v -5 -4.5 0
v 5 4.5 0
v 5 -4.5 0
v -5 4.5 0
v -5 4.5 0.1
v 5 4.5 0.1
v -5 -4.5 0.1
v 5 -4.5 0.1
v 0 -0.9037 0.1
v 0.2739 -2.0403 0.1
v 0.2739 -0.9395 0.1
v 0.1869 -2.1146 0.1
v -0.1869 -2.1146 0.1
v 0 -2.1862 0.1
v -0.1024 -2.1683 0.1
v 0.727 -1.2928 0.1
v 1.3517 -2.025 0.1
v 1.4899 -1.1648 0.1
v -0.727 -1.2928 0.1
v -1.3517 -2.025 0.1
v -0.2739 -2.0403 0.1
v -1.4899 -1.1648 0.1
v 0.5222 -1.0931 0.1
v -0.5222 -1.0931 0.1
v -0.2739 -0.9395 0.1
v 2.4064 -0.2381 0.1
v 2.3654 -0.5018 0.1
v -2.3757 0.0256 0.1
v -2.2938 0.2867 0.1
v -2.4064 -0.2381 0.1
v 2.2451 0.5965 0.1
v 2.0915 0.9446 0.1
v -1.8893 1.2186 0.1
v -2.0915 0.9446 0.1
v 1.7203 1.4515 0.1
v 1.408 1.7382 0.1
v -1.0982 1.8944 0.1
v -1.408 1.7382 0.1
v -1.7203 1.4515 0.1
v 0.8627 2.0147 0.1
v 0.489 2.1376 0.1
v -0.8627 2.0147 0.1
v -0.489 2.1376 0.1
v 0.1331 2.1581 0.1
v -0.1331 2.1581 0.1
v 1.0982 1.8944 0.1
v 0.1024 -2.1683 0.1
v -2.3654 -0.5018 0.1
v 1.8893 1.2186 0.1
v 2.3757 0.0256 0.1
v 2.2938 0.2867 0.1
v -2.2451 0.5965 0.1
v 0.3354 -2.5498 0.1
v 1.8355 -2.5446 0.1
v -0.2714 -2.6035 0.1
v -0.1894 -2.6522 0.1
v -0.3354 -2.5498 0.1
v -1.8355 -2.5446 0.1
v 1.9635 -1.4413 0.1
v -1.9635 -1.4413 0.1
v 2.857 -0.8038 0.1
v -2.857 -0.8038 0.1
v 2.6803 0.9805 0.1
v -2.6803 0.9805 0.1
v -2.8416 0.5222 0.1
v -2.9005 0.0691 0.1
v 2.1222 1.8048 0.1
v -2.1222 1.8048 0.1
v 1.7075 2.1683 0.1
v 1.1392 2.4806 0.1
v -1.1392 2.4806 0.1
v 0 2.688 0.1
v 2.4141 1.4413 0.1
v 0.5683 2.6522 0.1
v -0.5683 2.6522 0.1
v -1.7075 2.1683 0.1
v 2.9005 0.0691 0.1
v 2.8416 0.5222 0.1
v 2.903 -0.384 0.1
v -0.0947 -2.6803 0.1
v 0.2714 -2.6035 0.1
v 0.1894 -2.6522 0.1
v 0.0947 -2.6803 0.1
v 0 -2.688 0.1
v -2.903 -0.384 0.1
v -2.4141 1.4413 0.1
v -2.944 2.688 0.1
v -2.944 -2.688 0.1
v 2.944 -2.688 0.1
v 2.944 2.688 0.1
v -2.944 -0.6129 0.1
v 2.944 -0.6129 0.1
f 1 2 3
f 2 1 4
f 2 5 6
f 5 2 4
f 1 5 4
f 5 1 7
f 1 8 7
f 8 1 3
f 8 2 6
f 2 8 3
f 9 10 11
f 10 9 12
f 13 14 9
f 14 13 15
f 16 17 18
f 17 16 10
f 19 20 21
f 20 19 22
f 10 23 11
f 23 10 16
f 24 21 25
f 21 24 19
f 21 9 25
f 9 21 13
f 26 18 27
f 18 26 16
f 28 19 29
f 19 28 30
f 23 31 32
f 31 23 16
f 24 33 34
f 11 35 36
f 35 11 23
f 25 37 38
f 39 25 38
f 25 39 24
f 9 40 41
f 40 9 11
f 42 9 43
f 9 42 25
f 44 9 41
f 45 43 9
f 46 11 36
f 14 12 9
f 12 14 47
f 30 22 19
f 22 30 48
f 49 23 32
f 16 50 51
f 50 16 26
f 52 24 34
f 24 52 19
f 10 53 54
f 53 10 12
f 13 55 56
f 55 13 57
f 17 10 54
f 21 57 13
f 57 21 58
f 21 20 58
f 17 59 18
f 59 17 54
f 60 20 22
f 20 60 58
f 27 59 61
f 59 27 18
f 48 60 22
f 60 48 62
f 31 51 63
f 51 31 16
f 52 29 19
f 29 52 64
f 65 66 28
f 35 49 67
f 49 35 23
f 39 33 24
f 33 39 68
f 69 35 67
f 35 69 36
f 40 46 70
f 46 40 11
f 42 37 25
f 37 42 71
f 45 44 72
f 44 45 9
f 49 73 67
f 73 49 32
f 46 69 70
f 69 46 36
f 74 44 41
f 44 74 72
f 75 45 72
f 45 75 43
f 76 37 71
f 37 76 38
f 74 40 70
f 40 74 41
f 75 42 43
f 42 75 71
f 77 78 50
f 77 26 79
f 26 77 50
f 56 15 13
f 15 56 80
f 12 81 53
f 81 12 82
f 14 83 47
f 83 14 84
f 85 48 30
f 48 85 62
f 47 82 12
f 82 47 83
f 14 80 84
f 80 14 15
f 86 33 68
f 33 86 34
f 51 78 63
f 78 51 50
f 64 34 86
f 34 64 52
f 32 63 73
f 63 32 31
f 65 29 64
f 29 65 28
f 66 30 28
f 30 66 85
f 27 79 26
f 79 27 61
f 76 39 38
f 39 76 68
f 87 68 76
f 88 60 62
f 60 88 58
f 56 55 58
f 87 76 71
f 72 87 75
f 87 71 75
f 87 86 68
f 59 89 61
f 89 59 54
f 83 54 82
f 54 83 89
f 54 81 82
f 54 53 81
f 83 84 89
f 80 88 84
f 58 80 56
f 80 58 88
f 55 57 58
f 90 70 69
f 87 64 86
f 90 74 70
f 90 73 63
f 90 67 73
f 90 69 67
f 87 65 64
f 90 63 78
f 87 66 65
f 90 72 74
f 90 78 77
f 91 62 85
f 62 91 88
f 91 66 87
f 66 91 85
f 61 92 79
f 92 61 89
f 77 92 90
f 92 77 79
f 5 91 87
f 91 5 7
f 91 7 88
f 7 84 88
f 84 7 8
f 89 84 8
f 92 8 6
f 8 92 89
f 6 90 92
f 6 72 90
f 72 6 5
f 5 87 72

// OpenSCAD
// file: ../p/4-4edge.scad
use <../lib.scad>
$fa=1; $fs=0.2;
function ldraw_lib__4_4edge(realsolid=false) = [
// 0 Circle 1.0
// 0 Name: 4-4edge.dat
// 0 Author: James Jessiman
// 0 !LDRAW_ORG Primitive UPDATE 2017-01
// 0 !LICENSE Licensed under CC BY 2.0 and CC BY 4.0 : see CAreadme.txt
// 
// 0 BFC CERTIFY CCW
  [0,"BFC","CERTIFY"],
  [0,"BFC","CCW"],
// 
// 0 !HISTORY 1998-12-15 [PTadmin] Official Update 1998-10
// 0 !HISTORY 2005-12-28 [PTadmin] Official Update 2005-01
// 0 !HISTORY 2007-06-24 [PTadmin] Header formatted for Contributor Agreement
// 0 !HISTORY 2008-07-01 [PTadmin] Official Update 2008-01
// 0 !HISTORY 2017-01-15 [Steffen] BFCed
// 0 !HISTORY 2017-12-30 [PTadmin] Official Update 2017-01
// 
// 
// 2 24 1 0 0 0.9239 0 0.3827
  [2,24,1,0,0,0.9239,0,0.3827],
// 2 24 0.9239 0 0.3827 0.7071 0 0.7071
  [2,24,0.9239,0,0.3827,0.7071,0,0.7071],
// 2 24 0.7071 0 0.7071 0.3827 0 0.9239
  [2,24,0.7071,0,0.7071,0.3827,0,0.9239],
// 2 24 0.3827 0 0.9239 0 0 1
  [2,24,0.3827,0,0.9239,0,0,1],
// 2 24 0 0 1 -0.3827 0 0.9239
  [2,24,0,0,1,-0.3827,0,0.9239],
// 2 24 -0.3827 0 0.9239 -0.7071 0 0.7071
  [2,24,-0.3827,0,0.9239,-0.7071,0,0.7071],
// 2 24 -0.7071 0 0.7071 -0.9239 0 0.3827
  [2,24,-0.7071,0,0.7071,-0.9239,0,0.3827],
// 2 24 -0.9239 0 0.3827 -1 0 -0
  [2,24,-0.9239,0,0.3827,-1,0,-0],
// 2 24 -1 0 -0 -0.9239 0 -0.3827
  [2,24,-1,0,-0,-0.9239,0,-0.3827],
// 2 24 -0.9239 0 -0.3827 -0.7071 0 -0.7071
  [2,24,-0.9239,0,-0.3827,-0.7071,0,-0.7071],
// 2 24 -0.7071 0 -0.7071 -0.3827 0 -0.9239
  [2,24,-0.7071,0,-0.7071,-0.3827,0,-0.9239],
// 2 24 -0.3827 0 -0.9239 0 0 -1
  [2,24,-0.3827,0,-0.9239,0,0,-1],
// 2 24 0 0 -1 0.3827 0 -0.9239
  [2,24,0,0,-1,0.3827,0,-0.9239],
// 2 24 0.3827 0 -0.9239 0.7071 0 -0.7071
  [2,24,0.3827,0,-0.9239,0.7071,0,-0.7071],
// 2 24 0.7071 0 -0.7071 0.9239 0 -0.3827
  [2,24,0.7071,0,-0.7071,0.9239,0,-0.3827],
// 2 24 0.9239 0 -0.3827 1 0 0
  [2,24,0.9239,0,-0.3827,1,0,0],
];
module ldraw_lib__4_4edge(step=0, col=false, unit=2/5, alt=false, line=0.2, solid=!$preview)
    makepoly(ldraw_lib__4_4edge(solid), step=step, col=col, unit=unit, alt=alt, line=line, solid=solid);
ldraw_lib__4_4edge(line=0.2);
// file: ../p/4-4disc.scad
use <../lib.scad>
$fa=1; $fs=0.2;
function ldraw_lib__4_4disc(realsolid=false) = [
// 0 Disc 1.0
// 0 Name: 4-4disc.dat
// 0 Author: James Jessiman
// 0 !LDRAW_ORG Primitive UPDATE 2002-02
// 0 !LICENSE Licensed under CC BY 2.0 and CC BY 4.0 : see CAreadme.txt
// 
// 0 BFC CERTIFY CCW
  [0,"BFC","CERTIFY"],
  [0,"BFC","CCW"],
// 
// 0 !HISTORY 1998-12-15 [PTadmin] Official Update 1998-10
// 0 !HISTORY 2002-03-23 [sbliss] Added BFC statement
// 0 !HISTORY 2002-04-25 [PTadmin] Official Update 2002-02
// 0 !HISTORY 2007-06-24 [PTadmin] Header formatted for Contributor Agreement
// 0 !HISTORY 2008-07-01 [PTadmin] Official Update 2008-01
// 
// 
// 3 16 0 0 0 1 0 0 0.9239 0 0.3827
  [3,16,0,0,0,1,0,0,0.9239,0,0.3827],
// 3 16 0 0 0 0.9239 0 0.3827 0.7071 0 0.7071
  [3,16,0,0,0,0.9239,0,0.3827,0.7071,0,0.7071],
// 3 16 0 0 0 0.7071 0 0.7071 0.3827 0 0.9239
  [3,16,0,0,0,0.7071,0,0.7071,0.3827,0,0.9239],
// 3 16 0 0 0 0.3827 0 0.9239 0 0 1
  [3,16,0,0,0,0.3827,0,0.9239,0,0,1],
// 3 16 0 0 0 0 0 1 -0.3827 0 0.9239
  [3,16,0,0,0,0,0,1,-0.3827,0,0.9239],
// 3 16 0 0 0 -0.3827 0 0.9239 -0.7071 0 0.7071
  [3,16,0,0,0,-0.3827,0,0.9239,-0.7071,0,0.7071],
// 3 16 0 0 0 -0.7071 0 0.7071 -0.9239 0 0.3827
  [3,16,0,0,0,-0.7071,0,0.7071,-0.9239,0,0.3827],
// 3 16 0 0 0 -0.9239 0 0.3827 -1 0 -0
  [3,16,0,0,0,-0.9239,0,0.3827,-1,0,-0],
// 3 16 0 0 0 -1 0 -0 -0.9239 0 -0.3827
  [3,16,0,0,0,-1,0,-0,-0.9239,0,-0.3827],
// 3 16 0 0 0 -0.9239 0 -0.3827 -0.7071 0 -0.7071
  [3,16,0,0,0,-0.9239,0,-0.3827,-0.7071,0,-0.7071],
// 3 16 0 0 0 -0.7071 0 -0.7071 -0.3827 0 -0.9239
  [3,16,0,0,0,-0.7071,0,-0.7071,-0.3827,0,-0.9239],
// 3 16 0 0 0 -0.3827 0 -0.9239 0 0 -1
  [3,16,0,0,0,-0.3827,0,-0.9239,0,0,-1],
// 3 16 0 0 0 0 0 -1 0.3827 0 -0.9239
  [3,16,0,0,0,0,0,-1,0.3827,0,-0.9239],
// 3 16 0 0 0 0.3827 0 -0.9239 0.7071 0 -0.7071
  [3,16,0,0,0,0.3827,0,-0.9239,0.7071,0,-0.7071],
// 3 16 0 0 0 0.7071 0 -0.7071 0.9239 0 -0.3827
  [3,16,0,0,0,0.7071,0,-0.7071,0.9239,0,-0.3827],
// 3 16 0 0 0 0.9239 0 -0.3827 1 0 0
  [3,16,0,0,0,0.9239,0,-0.3827,1,0,0],
// 0
];
module ldraw_lib__4_4disc(step=0, col=false, unit=2/5, alt=false, line=0.2, solid=!$preview)
    makepoly(ldraw_lib__4_4disc(solid), step=step, col=col, unit=unit, alt=alt, line=line, solid=solid);
ldraw_lib__4_4disc(line=0.2);
// file: ../p/4-4cyli.scad
use <../lib.scad>
$fa=1; $fs=0.2;
function ldraw_lib__4_4cyli(realsolid=false) = [
// 0 Cylinder 1.0
// 0 Name: 4-4cyli.dat
// 0 Author: James Jessiman
// 0 !LDRAW_ORG Primitive UPDATE 2005-01
// 0 !LICENSE Licensed under CC BY 2.0 and CC BY 4.0 : see CAreadme.txt
// 
// 0 BFC CERTIFY CCW
  [0,"BFC","CERTIFY"],
  [0,"BFC","CCW"],
// 
// 0 !HISTORY 1998-12-15 [PTadmin] Official Update 1998-10
// 0 !HISTORY 2002-03-23 [sbliss] Added BFC statement; merged headers from files in distributions LDraw 0.27 and Complete.
// 0 !HISTORY 2002-04-25 [PTadmin] Official Update 2002-02
// 0 !HISTORY 2004-12-14 [guyvivan] BFC CCW
// 0 !HISTORY 2005-12-28 [PTadmin] Official Update 2005-01
// 0 !HISTORY 2007-06-24 [PTadmin] Header formatted for Contributor Agreement
// 0 !HISTORY 2008-07-01 [PTadmin] Official Update 2008-01
// 
// 
// 4 16 1 1 0 0.9239 1 0.3827 0.9239 0 0.3827 1 0 0
  [4,16,1,1,0,0.9239,1,0.3827,0.9239,0,0.3827,1,0,0],
// 5 24 1 0 0 1 1 0 0.9239 0 0.3827 0.9239 0 -0.3827
  [5,24,1,0,0,1,1,0,0.9239,0,0.3827,0.9239,0,-0.3827],
// 4 16 0.9239 1 0.3827 0.7071 1 0.7071 0.7071 0 0.7071 0.9239 0 0.3827
  [4,16,0.9239,1,0.3827,0.7071,1,0.7071,0.7071,0,0.7071,0.9239,0,0.3827],
// 5 24 0.9239 0 0.3827 0.9239 1 0.3827 0.7071 0 0.7071 1 0 0
  [5,24,0.9239,0,0.3827,0.9239,1,0.3827,0.7071,0,0.7071,1,0,0],
// 4 16 0.7071 1 0.7071 0.3827 1 0.9239 0.3827 0 0.9239 0.7071 0 0.7071
  [4,16,0.7071,1,0.7071,0.3827,1,0.9239,0.3827,0,0.9239,0.7071,0,0.7071],
// 5 24 0.7071 0 0.7071 0.7071 1 0.7071 0.3827 0 0.9239 0.9239 0 0.3827
  [5,24,0.7071,0,0.7071,0.7071,1,0.7071,0.3827,0,0.9239,0.9239,0,0.3827],
// 4 16 0.3827 1 0.9239 0 1 1 0 0 1 0.3827 0 0.9239
  [4,16,0.3827,1,0.9239,0,1,1,0,0,1,0.3827,0,0.9239],
// 5 24 0.3827 0 0.9239 0.3827 1 0.9239 0 0 1 0.7071 0 0.7071
  [5,24,0.3827,0,0.9239,0.3827,1,0.9239,0,0,1,0.7071,0,0.7071],
// 4 16 0 1 1 -0.3827 1 0.9239 -0.3827 0 0.9239 0 0 1
  [4,16,0,1,1,-0.3827,1,0.9239,-0.3827,0,0.9239,0,0,1],
// 5 24 0 0 1 0 1 1 -0.3827 0 0.9239 0.3827 0 0.9239
  [5,24,0,0,1,0,1,1,-0.3827,0,0.9239,0.3827,0,0.9239],
// 4 16 -0.3827 1 0.9239 -0.7071 1 0.7071 -0.7071 0 0.7071 -0.3827 0 0.9239
  [4,16,-0.3827,1,0.9239,-0.7071,1,0.7071,-0.7071,0,0.7071,-0.3827,0,0.9239],
// 5 24 -0.3827 0 0.9239 -0.3827 1 0.9239 -0.7071 0 0.7071 0 0 1
  [5,24,-0.3827,0,0.9239,-0.3827,1,0.9239,-0.7071,0,0.7071,0,0,1],
// 4 16 -0.7071 1 0.7071 -0.9239 1 0.3827 -0.9239 0 0.3827 -0.7071 0 0.7071
  [4,16,-0.7071,1,0.7071,-0.9239,1,0.3827,-0.9239,0,0.3827,-0.7071,0,0.7071],
// 5 24 -0.7071 0 0.7071 -0.7071 1 0.7071 -0.9239 0 0.3827 -0.3827 0 0.9239
  [5,24,-0.7071,0,0.7071,-0.7071,1,0.7071,-0.9239,0,0.3827,-0.3827,0,0.9239],
// 4 16 -0.9239 1 0.3827 -1 1 0 -1 0 0 -0.9239 0 0.3827
  [4,16,-0.9239,1,0.3827,-1,1,0,-1,0,0,-0.9239,0,0.3827],
// 5 24 -0.9239 0 0.3827 -0.9239 1 0.3827 -1 0 0 -0.7071 0 0.7071
  [5,24,-0.9239,0,0.3827,-0.9239,1,0.3827,-1,0,0,-0.7071,0,0.7071],
// 4 16 -1 1 0 -0.9239 1 -0.3827 -0.9239 0 -0.3827 -1 0 0
  [4,16,-1,1,0,-0.9239,1,-0.3827,-0.9239,0,-0.3827,-1,0,0],
// 5 24 -1 0 0 -1 1 0 -0.9239 0 -0.3827 -0.9239 0 0.3827
  [5,24,-1,0,0,-1,1,0,-0.9239,0,-0.3827,-0.9239,0,0.3827],
// 4 16 -0.9239 1 -0.3827 -0.7071 1 -0.7071 -0.7071 0 -0.7071 -0.9239 0 -0.3827
  [4,16,-0.9239,1,-0.3827,-0.7071,1,-0.7071,-0.7071,0,-0.7071,-0.9239,0,-0.3827],
// 5 24 -0.9239 0 -0.3827 -0.9239 1 -0.3827 -0.7071 0 -0.7071 -1 0 0
  [5,24,-0.9239,0,-0.3827,-0.9239,1,-0.3827,-0.7071,0,-0.7071,-1,0,0],
// 4 16 -0.7071 1 -0.7071 -0.3827 1 -0.9239 -0.3827 0 -0.9239 -0.7071 0 -0.7071
  [4,16,-0.7071,1,-0.7071,-0.3827,1,-0.9239,-0.3827,0,-0.9239,-0.7071,0,-0.7071],
// 5 24 -0.7071 0 -0.7071 -0.7071 1 -0.7071 -0.3827 0 -0.9239 -0.9239 0 -0.3827
  [5,24,-0.7071,0,-0.7071,-0.7071,1,-0.7071,-0.3827,0,-0.9239,-0.9239,0,-0.3827],
// 4 16 -0.3827 1 -0.9239 0 1 -1 0 0 -1 -0.3827 0 -0.9239
  [4,16,-0.3827,1,-0.9239,0,1,-1,0,0,-1,-0.3827,0,-0.9239],
// 5 24 -0.3827 0 -0.9239 -0.3827 1 -0.9239 0 0 -1 -0.7071 0 -0.7071
  [5,24,-0.3827,0,-0.9239,-0.3827,1,-0.9239,0,0,-1,-0.7071,0,-0.7071],
// 4 16 0 1 -1 0.3827 1 -0.9239 0.3827 0 -0.9239 0 0 -1
  [4,16,0,1,-1,0.3827,1,-0.9239,0.3827,0,-0.9239,0,0,-1],
// 5 24 0 0 -1 0 1 -1 0.3827 0 -0.9239 -0.3827 0 -0.9239
  [5,24,0,0,-1,0,1,-1,0.3827,0,-0.9239,-0.3827,0,-0.9239],
// 4 16 0.3827 1 -0.9239 0.7071 1 -0.7071 0.7071 0 -0.7071 0.3827 0 -0.9239
  [4,16,0.3827,1,-0.9239,0.7071,1,-0.7071,0.7071,0,-0.7071,0.3827,0,-0.9239],
// 5 24 0.3827 0 -0.9239 0.3827 1 -0.9239 0.7071 0 -0.7071 0 0 -1
  [5,24,0.3827,0,-0.9239,0.3827,1,-0.9239,0.7071,0,-0.7071,0,0,-1],
// 4 16 0.7071 1 -0.7071 0.9239 1 -0.3827 0.9239 0 -0.3827 0.7071 0 -0.7071
  [4,16,0.7071,1,-0.7071,0.9239,1,-0.3827,0.9239,0,-0.3827,0.7071,0,-0.7071],
// 5 24 0.7071 0 -0.7071 0.7071 1 -0.7071 0.9239 0 -0.3827 0.3827 0 -0.9239
  [5,24,0.7071,0,-0.7071,0.7071,1,-0.7071,0.9239,0,-0.3827,0.3827,0,-0.9239],
// 4 16 0.9239 1 -0.3827 1 1 0 1 0 0 0.9239 0 -0.3827
  [4,16,0.9239,1,-0.3827,1,1,0,1,0,0,0.9239,0,-0.3827],
// 5 24 0.9239 0 -0.3827 0.9239 1 -0.3827 1 0 0 0.7071 0 -0.7071
  [5,24,0.9239,0,-0.3827,0.9239,1,-0.3827,1,0,0,0.7071,0,-0.7071],
// 0
];
module ldraw_lib__4_4cyli(step=0, col=false, unit=2/5, alt=false, line=0.2, solid=!$preview)
    makepoly(ldraw_lib__4_4cyli(solid), step=step, col=col, unit=unit, alt=alt, line=line, solid=solid);
ldraw_lib__4_4cyli(line=0.2);
// file: ../p/stud3.scad
use <../lib.scad>
use <4-4cyli.scad>
use <4-4disc.scad>
use <4-4edge.scad>
$fa=1; $fs=0.2;
function ldraw_lib__stud3(realsolid=false) = realsolid ? 
    [openscad(translate([0,0,-eps()], o=cylinder(4+eps(), r=4)),2)] : [
// 0 Stud Tube Solid
// 0 Name: stud3.dat
// 0 Author: James Jessiman
// 0 !LDRAW_ORG Primitive UPDATE 2012-01
// 0 !LICENSE Licensed under CC BY 2.0 and CC BY 4.0 : see CAreadme.txt
// 
// 0 BFC CERTIFY CCW
  [0,"BFC","CERTIFY"],
  [0,"BFC","CCW"],
// 
// 0 !HISTORY 2002-04-04 [sbliss] Modified for BFC compliance
// 0 !HISTORY 2002-04-25 [PTadmin] Official Update 2002-02
// 0 !HISTORY 2007-06-24 [PTadmin] Header formatted for Contributor Agreement
// 0 !HISTORY 2008-07-01 [PTadmin] Official Update 2008-01
// 0 !HISTORY 2012-02-16 [Philo] Changed to CCW
// 0 !HISTORY 2012-03-30 [PTadmin] Official Update 2012-01
// 
// 
// 1 16 0 -4 0 4 0 0 0 1 0 0 0 4 4-4edge.dat
  [1,16,0,-4,0,4,0,0,0,1,0,0,0,4, ldraw_lib__4_4edge(realsolid)],
// 1 16 0 0 0 4 0 0 0 1 0 0 0 4 4-4edge.dat
  [1,16,0,0,0,4,0,0,0,1,0,0,0,4, ldraw_lib__4_4edge(realsolid)],
// 1 16 0 -4 0 4 0 0 0 1 0 0 0 4 4-4disc.dat
  [1,16,0,-4,0,4,0,0,0,1,0,0,0,4, ldraw_lib__4_4disc(realsolid)],
// 1 16 0 -4 0 4 0 0 0 4 0 0 0 4 4-4cyli.dat
  [1,16,0,-4,0,4,0,0,0,4,0,0,0,4, ldraw_lib__4_4cyli(realsolid)],
];
module ldraw_lib__stud3(step=0, col=false, unit=2/5, alt=false, line=0.2, solid=!$preview)
    makepoly(ldraw_lib__stud3(solid), step=step, col=col, unit=unit, alt=alt, line=line, solid=solid);
ldraw_lib__stud3(line=0.2);
// file: ../p/stud.scad
use <../lib.scad>
use <4-4cyli.scad>
use <4-4disc.scad>
use <4-4edge.scad>
$fa=1; $fs=0.2;
function ldraw_lib__stud(realsolid=false) = realsolid ? 
    [openscad(translate([0,0,-eps()], o=cylinder(4+eps(), r=6)),2)] : [
// 0 Stud
// 0 Name: stud.dat
// 0 Author: James Jessiman
// 0 !LDRAW_ORG Primitive UPDATE 2012-01
// 0 !LICENSE Licensed under CC BY 2.0 and CC BY 4.0 : see CAreadme.txt
// 
// 0 BFC CERTIFY CCW
  [0,"BFC","CERTIFY"],
  [0,"BFC","CCW"],
// 
// 0 !HISTORY 2002-04-04 [sbliss] Modified for BFC compliance
// 0 !HISTORY 2002-04-25 [PTadmin] Official Update 2002-02
// 0 !HISTORY 2007-06-24 [PTadmin] Header formatted for Contributor Agreement
// 0 !HISTORY 2008-07-01 [PTadmin] Official Update 2008-01
// 0 !HISTORY 2012-02-16 [Philo] Changed to CCW
// 0 !HISTORY 2012-03-30 [PTadmin] Official Update 2012-01
// 
// 
// 1 16 0 0 0 6 0 0 0 1 0 0 0 6 4-4edge.dat
  [1,16,0,0,0,6,0,0,0,1,0,0,0,6, ldraw_lib__4_4edge(realsolid)],
// 1 16 0 -4 0 6 0 0 0 1 0 0 0 6 4-4edge.dat
  [1,16,0,-4,0,6,0,0,0,1,0,0,0,6, ldraw_lib__4_4edge(realsolid)],
// 1 16 0 0 0 6 0 0 0 -4 0 0 0 6 4-4cyli.dat
  [1,16,0,0,0,6,0,0,0,-4,0,0,0,6, ldraw_lib__4_4cyli(realsolid)],
// 1 16 0 -4 0 6 0 0 0 1 0 0 0 6 4-4disc.dat
  [1,16,0,-4,0,6,0,0,0,1,0,0,0,6, ldraw_lib__4_4disc(realsolid)],
];
module ldraw_lib__stud(step=0, col=false, unit=2/5, alt=false, line=0.2, solid=!$preview)
    makepoly(ldraw_lib__stud(solid), step=step, col=col, unit=unit, alt=alt, line=line, solid=solid);
ldraw_lib__stud(line=0.2);
// file: ../p/box5.scad
use <../lib.scad>
$fa=1; $fs=0.2;
function ldraw_lib__box5(realsolid=false) = [
// 0 Box with 5 Faces and All Edges
// 0 Name: box5.dat
// 0 Author: James Jessiman
// 0 !LDRAW_ORG Primitive UPDATE 2012-01
// 0 !LICENSE Licensed under CC BY 2.0 and CC BY 4.0 : see CAreadme.txt
// 
// 0 BFC CERTIFY CCW
  [0,"BFC","CERTIFY"],
  [0,"BFC","CCW"],
// 
// 0 !HISTORY 2002-04-03 [sbliss] Modified for BFC compliance
// 0 !HISTORY 2002-04-25 [PTadmin] Official Update 2002-02
// 0 !HISTORY 2007-06-24 [PTadmin] Header formatted for Contributor Agreement
// 0 !HISTORY 2008-07-01 [PTadmin] Official Update 2008-01
// 0 !HISTORY 2012-02-16 [Philo] Changed to CCW
// 0 !HISTORY 2012-03-30 [PTadmin] Official Update 2012-01
// 
// 
// 2 24 1 1 1 -1 1 1
  [2,24,1,1,1,-1,1,1],
// 2 24 -1 1 1 -1 1 -1
  [2,24,-1,1,1,-1,1,-1],
// 2 24 -1 1 -1 1 1 -1
  [2,24,-1,1,-1,1,1,-1],
// 2 24 1 1 -1 1 1 1
  [2,24,1,1,-1,1,1,1],
// 2 24 1 0 1 -1 0 1
  [2,24,1,0,1,-1,0,1],
// 2 24 -1 0 1 -1 0 -1
  [2,24,-1,0,1,-1,0,-1],
// 2 24 -1 0 -1 1 0 -1
  [2,24,-1,0,-1,1,0,-1],
// 2 24 1 0 -1 1 0 1
  [2,24,1,0,-1,1,0,1],
// 2 24 1 0 1 1 1 1
  [2,24,1,0,1,1,1,1],
// 2 24 -1 0 1 -1 1 1
  [2,24,-1,0,1,-1,1,1],
// 2 24 1 0 -1 1 1 -1
  [2,24,1,0,-1,1,1,-1],
// 2 24 -1 0 -1 -1 1 -1
  [2,24,-1,0,-1,-1,1,-1],
// 4 16 -1 1 1 1 1 1 1 1 -1 -1 1 -1
  [4,16,-1,1,1,1,1,1,1,1,-1,-1,1,-1],
// 4 16 -1 1 1 -1 0 1 1 0 1 1 1 1
  [4,16,-1,1,1,-1,0,1,1,0,1,1,1,1],
// 4 16 -1 1 -1 -1 0 -1 -1 0 1 -1 1 1
  [4,16,-1,1,-1,-1,0,-1,-1,0,1,-1,1,1],
// 4 16 1 1 -1 1 0 -1 -1 0 -1 -1 1 -1
  [4,16,1,1,-1,1,0,-1,-1,0,-1,-1,1,-1],
// 4 16 1 1 1 1 0 1 1 0 -1 1 1 -1
  [4,16,1,1,1,1,0,1,1,0,-1,1,1,-1],
];
module ldraw_lib__box5(step=0, col=false, unit=2/5, alt=false, line=0.2, solid=!$preview)
    makepoly(ldraw_lib__box5(solid), step=step, col=col, unit=unit, alt=alt, line=line, solid=solid);
ldraw_lib__box5(line=0.2);
// file: ../p/box4t.scad
use <../lib.scad>
$fa=1; $fs=0.2;
function ldraw_lib__box4t(realsolid=false) = [
// 0 Box with 4 Adjacent Faces and All Edges
// 0 Name: box4t.dat
// 0 Author: Tore Eriksson [Tore_Eriksson]
// 0 !LDRAW_ORG Primitive UPDATE 2003-02
// 0 !LICENSE Licensed under CC BY 2.0 and CC BY 4.0 : see CAreadme.txt
// 
// 0 BFC CERTIFY CCW
  [0,"BFC","CERTIFY"],
  [0,"BFC","CCW"],
// 
// 0 !HISTORY 1997-09-29 [PTadmin] Official Update 1997-15
// 0 !HISTORY 2002-08-31 [izanette] Modified with WINDZ for BFC compliance
// 0 !HISTORY 2003-08-01 [PTadmin] Official Update 2003-02
// 0 !HISTORY 2007-06-24 [PTadmin] Header formatted for Contributor Agreement
// 0 !HISTORY 2008-07-01 [PTadmin] Official Update 2008-01
// 
// 
// 2 24 1 1 1 -1 1 1
  [2,24,1,1,1,-1,1,1],
// 2 24 -1 1 1 -1 1 -1
  [2,24,-1,1,1,-1,1,-1],
// 2 24 -1 1 -1 1 1 -1
  [2,24,-1,1,-1,1,1,-1],
// 2 24 1 1 -1 1 1 1
  [2,24,1,1,-1,1,1,1],
// 2 24 1 0 1 -1 0 1
  [2,24,1,0,1,-1,0,1],
// 2 24 -1 0 1 -1 0 -1
  [2,24,-1,0,1,-1,0,-1],
// 2 24 -1 0 -1 1 0 -1
  [2,24,-1,0,-1,1,0,-1],
// 2 24 1 0 -1 1 0 1
  [2,24,1,0,-1,1,0,1],
// 2 24 1 0 1 1 1 1
  [2,24,1,0,1,1,1,1],
// 2 24 -1 0 1 -1 1 1
  [2,24,-1,0,1,-1,1,1],
// 2 24 1 0 -1 1 1 -1
  [2,24,1,0,-1,1,1,-1],
// 2 24 -1 0 -1 -1 1 -1
  [2,24,-1,0,-1,-1,1,-1],
// 4 16 1 1 1 1 1 -1 -1 1 -1 -1 1 1
  [4,16,1,1,1,1,1,-1,-1,1,-1,-1,1,1],
// 4 16 1 1 1 -1 1 1 -1 0 1 1 0 1
  [4,16,1,1,1,-1,1,1,-1,0,1,1,0,1],
// 4 16 -1 1 1 -1 1 -1 -1 0 -1 -1 0 1
  [4,16,-1,1,1,-1,1,-1,-1,0,-1,-1,0,1],
// 0 4 16 -1 1 -1 -1 0 -1 1 0 -1 1 1 -1
// 4 16 1 1 -1 1 1 1 1 0 1 1 0 -1
  [4,16,1,1,-1,1,1,1,1,0,1,1,0,-1],
// 0
];
module ldraw_lib__box4t(step=0, col=false, unit=2/5, alt=false, line=0.2, solid=!$preview)
    makepoly(ldraw_lib__box4t(solid), step=step, col=col, unit=unit, alt=alt, line=line, solid=solid);
ldraw_lib__box4t(line=0.2);
// file: s/3004s01.scad
use <../../lib.scad>
use <../../p/box4t.scad>
use <../../p/box5.scad>
use <../../p/stud.scad>
use <../../p/stud3.scad>
$fa=1; $fs=0.2;
function ldraw_lib__s__3004s01(realsolid=false) = [
// 0 ~Brick  1 x  2 without Front Face
// 0 Name: s\3004s01.dat
// 0 Author: James Jessiman
// 0 !LDRAW_ORG Subpart UPDATE 2003-03
// 0 !LICENSE Licensed under CC BY 2.0 and CC BY 4.0 : see CAreadme.txt
// 
// 0 BFC CERTIFY CCW
  [0,"BFC","CERTIFY"],
  [0,"BFC","CCW"],
// 
// 0 !HISTORY 2003-09-07 [jriley] Subfiling, BFC
// 0 !HISTORY 2003-12-19 [PTadmin] Official Update 2003-03
// 0 !HISTORY 2007-08-29 [PTadmin] Header formatted for Contributor Agreement
// 0 !HISTORY 2008-07-01 [PTadmin] Official Update 2008-01
// 
// 
// 1 16 0 4 0 1 0 0 0 -5 0 0 0 1 stud3.dat
  [1,16,0,4,0,1,0,0,0,-5,0,0,0,1, ldraw_lib__stud3(realsolid)],
// 0 BFC INVERTNEXT
  [0,"BFC","INVERTNEXT"],
// 1 16 0 24 0 16 0 0 0 -20 0 0 0 6 box5.dat
  [1,16,0,24,0,16,0,0,0,-20,0,0,0,6, ldraw_lib__box5(realsolid)],
// 4 16 20 24 10 16 24 6 -16 24 6 -20 24 10
  [4,16,20,24,10,16,24,6,-16,24,6,-20,24,10],
// 4 16 -20 24 10 -16 24 6 -16 24 -6 -20 24 -10
  [4,16,-20,24,10,-16,24,6,-16,24,-6,-20,24,-10],
// 4 16 -20 24 -10 -16 24 -6 16 24 -6 20 24 -10
  [4,16,-20,24,-10,-16,24,-6,16,24,-6,20,24,-10],
// 4 16 20 24 -10 16 24 -6 16 24 6 20 24 10
  [4,16,20,24,-10,16,24,-6,16,24,6,20,24,10],
// 1 16 0 24 0 20 0 0 0 -24 0 0 0 10 box4t.dat
  [1,16,0,24,0,20,0,0,0,-24,0,0,0,10, ldraw_lib__box4t(realsolid)],
// 1 16 10 0 0 1 0 0 0 1 0 0 0 1 stud.dat
  [1,16,10,0,0,1,0,0,0,1,0,0,0,1, ldraw_lib__stud(realsolid)],
// 1 16 -10 0 0 1 0 0 0 1 0 0 0 1 stud.dat
  [1,16,-10,0,0,1,0,0,0,1,0,0,0,1, ldraw_lib__stud(realsolid)],
// 0
];
module ldraw_lib__s__3004s01(step=0, col=false, unit=2/5, alt=false, line=0.2, solid=!$preview)
    makepoly(ldraw_lib__s__3004s01(solid), step=step, col=col, unit=unit, alt=alt, line=line, solid=solid);
ldraw_lib__s__3004s01(line=0.2);
// file: 3004.scad
use <../lib.scad>
use <s/3004s01.scad>
$fa=1; $fs=0.2;
function ldraw_lib__3004(realsolid=false) = [
// 0 Brick  1 x  2
// 0 Name: 3004.dat
// 0 Author: James Jessiman
// 0 !LDRAW_ORG Part UPDATE 2022-05
// 0 !LICENSE Licensed under CC BY 2.0 and CC BY 4.0 : see CAreadme.txt
// 
// 0 BFC CERTIFY CCW
  [0,"BFC","CERTIFY"],
  [0,"BFC","CCW"],
// 
// 0 !HISTORY 2001-10-26 [PTadmin] Official Update 2001-01
// 0 !HISTORY 2002-05-07 {unknown} BFC Certification
// 0 !HISTORY 2002-06-11 [PTadmin] Official Update 2002-03
// 0 !HISTORY 2007-05-07 [PTadmin] Header formatted for Contributor Agreement
// 0 !HISTORY 2008-07-01 [PTadmin] Official Update 2008-01
// 0 !HISTORY 2022-08-04 [MagFors] Using subfile
// 0 !HISTORY 2022-09-15 [PTadmin] Official Update 2022-05
// 
// 
// 1 16 0 0 0 1 0 0 0 1 0 0 0 1 s\3004s01.dat
  [1,16,0,0,0,1,0,0,0,1,0,0,0,1, ldraw_lib__s__3004s01(realsolid)],
// 4 16 -20 24 -10 20 24 -10 20 0 -10 -20 0 -10
  [4,16,-20,24,-10,20,24,-10,20,0,-10,-20,0,-10],
];
module ldraw_lib__3004(step=0, col=false, unit=2/5, alt=false, line=0.2, solid=!$preview)
    makepoly(ldraw_lib__3004(solid), step=step, col=col, unit=unit, alt=alt, line=line, solid=solid);
ldraw_lib__3004(line=0.2);
// file: ../p/box5-12.scad
use <../lib.scad>
$fa=1; $fs=0.2;
function ldraw_lib__box5_12(realsolid=false) = [
// 0 Box with 5 Faces without Any Edges
// 0 Name: box5-12.dat
// 0 Author: Chris Dee [cwdee]
// 0 !LDRAW_ORG Primitive UPDATE 2009-02
// 0 !LICENSE Licensed under CC BY 2.0 and CC BY 4.0 : see CAreadme.txt
// 
// 0 BFC CERTIFY CCW
  [0,"BFC","CERTIFY"],
  [0,"BFC","CCW"],
// 
// 0 !HISTORY 2009-09-03 [PTadmin] Official Update 2009-02
// 
// 
// 4 16 1 1 1 1 1 -1 -1 1 -1 -1 1 1
  [4,16,1,1,1,1,1,-1,-1,1,-1,-1,1,1],
// 4 16 -1 0 1 1 0 1 1 1 1 -1 1 1
  [4,16,-1,0,1,1,0,1,1,1,1,-1,1,1],
// 4 16 -1 0 -1 -1 0 1 -1 1 1 -1 1 -1
  [4,16,-1,0,-1,-1,0,1,-1,1,1,-1,1,-1],
// 4 16 1 0 -1 -1 0 -1 -1 1 -1 1 1 -1
  [4,16,1,0,-1,-1,0,-1,-1,1,-1,1,1,-1],
// 4 16 1 0 1 1 0 -1 1 1 -1 1 1 1
  [4,16,1,0,1,1,0,-1,1,1,-1,1,1,1],
// 0
];
module ldraw_lib__box5_12(step=0, col=false, unit=2/5, alt=false, line=0.2, solid=!$preview)
    makepoly(ldraw_lib__box5_12(solid), step=step, col=col, unit=unit, alt=alt, line=line, solid=solid);
ldraw_lib__box5_12(line=0.2);
// main file
use <../lib.scad>
use <../p/box5-12.scad>
use <s/3004s60.scad>
$fa=1; $fs=0.2;
function ldraw_lib__004318b(realsolid=false) = [
// 0 Sticker  1.1 x  1.25 with Shell Logo 1971
// 0 Name: 004318b.dat
// 0 Author: Alex Taylor [anathema]
// 0 !LDRAW_ORG Part UPDATE 2019-03
// 0 !LICENSE Licensed under CC BY 2.0 and CC BY 4.0 : see CAreadme.txt
// 
// 0 BFC CERTIFY CCW
  [0,"BFC","CERTIFY"],
  [0,"BFC","CCW"],
// 
// 0 !KEYWORDS set 601, set 604
// 
// 0 !HISTORY 2019-12-27 [PTadmin] Official Update 2019-03
// 
// 
// 1 16 0 -0.25 0 12.5 0 0 0 0.25 0 0 0 11.25 box5-12.dat
  [1,16,0,-0.25,0,12.5,0,0,0,0.25,0,0,0,11.25, ldraw_lib__box5_12(realsolid)],
// 1 15 0 -0.25 0 0.64 0 0 0 0 1 0 -0.64 0 s\3004s60.dat
  [1,15,0,-0.25,0,0.64,0,0,0,0,1,0,-0.64,0, ldraw_lib__s__3004s60(realsolid)],
// 
// 4 15 -7.36 -0.25 -1.53216 -7.36 -0.25 6.72 -12.5 -0.25 11.25 -12.5 -0.25 -11.25
  [4,15,-7.36,-0.25,-1.53216,-7.36,-0.25,6.72,-12.5,-0.25,11.25,-12.5,-0.25,-11.25],
// 3 15 -7.36 -0.25 -1.53216 -12.5 -0.25 -11.25 -7.36 -0.25 -6.72
  [3,15,-7.36,-0.25,-1.53216,-12.5,-0.25,-11.25,-7.36,-0.25,-6.72],
// 4 15 0 -0.25 -6.72 -7.36 -0.25 -6.72 -12.5 -0.25 -11.25 12.5 -0.25 -11.25
  [4,15,0,-0.25,-6.72,-7.36,-0.25,-6.72,-12.5,-0.25,-11.25,12.5,-0.25,-11.25],
// 3 15 7.36 -0.25 -6.72 0 -0.25 -6.72 12.5 -0.25 -11.25
  [3,15,7.36,-0.25,-6.72,0,-0.25,-6.72,12.5,-0.25,-11.25],
// 4 15 7.36 -0.25 -1.53216 7.36 -0.25 -6.72 12.5 -0.25 -11.25 12.5 -0.25 11.25
  [4,15,7.36,-0.25,-1.53216,7.36,-0.25,-6.72,12.5,-0.25,-11.25,12.5,-0.25,11.25],
// 3 15 12.5 -0.25 11.25 7.36 -0.25 6.72 7.36 -0.25 -1.53216
  [3,15,12.5,-0.25,11.25,7.36,-0.25,6.72,7.36,-0.25,-1.53216],
// 4 15 0 -0.25 6.72 7.36 -0.25 6.72 12.5 -0.25 11.25 -12.5 -0.25 11.25
  [4,15,0,-0.25,6.72,7.36,-0.25,6.72,12.5,-0.25,11.25,-12.5,-0.25,11.25],
// 3 15 -12.5 -0.25 11.25 -7.36 -0.25 6.72 0 -0.25 6.72
  [3,15,-12.5,-0.25,11.25,-7.36,-0.25,6.72,0,-0.25,6.72],
// 0
];
module ldraw_lib__004318b(step=0, col=false, unit=2/5, alt=false, line=0.2, solid=!$preview)
    makepoly(ldraw_lib__004318b(solid), step=step, col=col, unit=unit, alt=alt, line=line, solid=solid);
ldraw_lib__004318b(line=0.2);
